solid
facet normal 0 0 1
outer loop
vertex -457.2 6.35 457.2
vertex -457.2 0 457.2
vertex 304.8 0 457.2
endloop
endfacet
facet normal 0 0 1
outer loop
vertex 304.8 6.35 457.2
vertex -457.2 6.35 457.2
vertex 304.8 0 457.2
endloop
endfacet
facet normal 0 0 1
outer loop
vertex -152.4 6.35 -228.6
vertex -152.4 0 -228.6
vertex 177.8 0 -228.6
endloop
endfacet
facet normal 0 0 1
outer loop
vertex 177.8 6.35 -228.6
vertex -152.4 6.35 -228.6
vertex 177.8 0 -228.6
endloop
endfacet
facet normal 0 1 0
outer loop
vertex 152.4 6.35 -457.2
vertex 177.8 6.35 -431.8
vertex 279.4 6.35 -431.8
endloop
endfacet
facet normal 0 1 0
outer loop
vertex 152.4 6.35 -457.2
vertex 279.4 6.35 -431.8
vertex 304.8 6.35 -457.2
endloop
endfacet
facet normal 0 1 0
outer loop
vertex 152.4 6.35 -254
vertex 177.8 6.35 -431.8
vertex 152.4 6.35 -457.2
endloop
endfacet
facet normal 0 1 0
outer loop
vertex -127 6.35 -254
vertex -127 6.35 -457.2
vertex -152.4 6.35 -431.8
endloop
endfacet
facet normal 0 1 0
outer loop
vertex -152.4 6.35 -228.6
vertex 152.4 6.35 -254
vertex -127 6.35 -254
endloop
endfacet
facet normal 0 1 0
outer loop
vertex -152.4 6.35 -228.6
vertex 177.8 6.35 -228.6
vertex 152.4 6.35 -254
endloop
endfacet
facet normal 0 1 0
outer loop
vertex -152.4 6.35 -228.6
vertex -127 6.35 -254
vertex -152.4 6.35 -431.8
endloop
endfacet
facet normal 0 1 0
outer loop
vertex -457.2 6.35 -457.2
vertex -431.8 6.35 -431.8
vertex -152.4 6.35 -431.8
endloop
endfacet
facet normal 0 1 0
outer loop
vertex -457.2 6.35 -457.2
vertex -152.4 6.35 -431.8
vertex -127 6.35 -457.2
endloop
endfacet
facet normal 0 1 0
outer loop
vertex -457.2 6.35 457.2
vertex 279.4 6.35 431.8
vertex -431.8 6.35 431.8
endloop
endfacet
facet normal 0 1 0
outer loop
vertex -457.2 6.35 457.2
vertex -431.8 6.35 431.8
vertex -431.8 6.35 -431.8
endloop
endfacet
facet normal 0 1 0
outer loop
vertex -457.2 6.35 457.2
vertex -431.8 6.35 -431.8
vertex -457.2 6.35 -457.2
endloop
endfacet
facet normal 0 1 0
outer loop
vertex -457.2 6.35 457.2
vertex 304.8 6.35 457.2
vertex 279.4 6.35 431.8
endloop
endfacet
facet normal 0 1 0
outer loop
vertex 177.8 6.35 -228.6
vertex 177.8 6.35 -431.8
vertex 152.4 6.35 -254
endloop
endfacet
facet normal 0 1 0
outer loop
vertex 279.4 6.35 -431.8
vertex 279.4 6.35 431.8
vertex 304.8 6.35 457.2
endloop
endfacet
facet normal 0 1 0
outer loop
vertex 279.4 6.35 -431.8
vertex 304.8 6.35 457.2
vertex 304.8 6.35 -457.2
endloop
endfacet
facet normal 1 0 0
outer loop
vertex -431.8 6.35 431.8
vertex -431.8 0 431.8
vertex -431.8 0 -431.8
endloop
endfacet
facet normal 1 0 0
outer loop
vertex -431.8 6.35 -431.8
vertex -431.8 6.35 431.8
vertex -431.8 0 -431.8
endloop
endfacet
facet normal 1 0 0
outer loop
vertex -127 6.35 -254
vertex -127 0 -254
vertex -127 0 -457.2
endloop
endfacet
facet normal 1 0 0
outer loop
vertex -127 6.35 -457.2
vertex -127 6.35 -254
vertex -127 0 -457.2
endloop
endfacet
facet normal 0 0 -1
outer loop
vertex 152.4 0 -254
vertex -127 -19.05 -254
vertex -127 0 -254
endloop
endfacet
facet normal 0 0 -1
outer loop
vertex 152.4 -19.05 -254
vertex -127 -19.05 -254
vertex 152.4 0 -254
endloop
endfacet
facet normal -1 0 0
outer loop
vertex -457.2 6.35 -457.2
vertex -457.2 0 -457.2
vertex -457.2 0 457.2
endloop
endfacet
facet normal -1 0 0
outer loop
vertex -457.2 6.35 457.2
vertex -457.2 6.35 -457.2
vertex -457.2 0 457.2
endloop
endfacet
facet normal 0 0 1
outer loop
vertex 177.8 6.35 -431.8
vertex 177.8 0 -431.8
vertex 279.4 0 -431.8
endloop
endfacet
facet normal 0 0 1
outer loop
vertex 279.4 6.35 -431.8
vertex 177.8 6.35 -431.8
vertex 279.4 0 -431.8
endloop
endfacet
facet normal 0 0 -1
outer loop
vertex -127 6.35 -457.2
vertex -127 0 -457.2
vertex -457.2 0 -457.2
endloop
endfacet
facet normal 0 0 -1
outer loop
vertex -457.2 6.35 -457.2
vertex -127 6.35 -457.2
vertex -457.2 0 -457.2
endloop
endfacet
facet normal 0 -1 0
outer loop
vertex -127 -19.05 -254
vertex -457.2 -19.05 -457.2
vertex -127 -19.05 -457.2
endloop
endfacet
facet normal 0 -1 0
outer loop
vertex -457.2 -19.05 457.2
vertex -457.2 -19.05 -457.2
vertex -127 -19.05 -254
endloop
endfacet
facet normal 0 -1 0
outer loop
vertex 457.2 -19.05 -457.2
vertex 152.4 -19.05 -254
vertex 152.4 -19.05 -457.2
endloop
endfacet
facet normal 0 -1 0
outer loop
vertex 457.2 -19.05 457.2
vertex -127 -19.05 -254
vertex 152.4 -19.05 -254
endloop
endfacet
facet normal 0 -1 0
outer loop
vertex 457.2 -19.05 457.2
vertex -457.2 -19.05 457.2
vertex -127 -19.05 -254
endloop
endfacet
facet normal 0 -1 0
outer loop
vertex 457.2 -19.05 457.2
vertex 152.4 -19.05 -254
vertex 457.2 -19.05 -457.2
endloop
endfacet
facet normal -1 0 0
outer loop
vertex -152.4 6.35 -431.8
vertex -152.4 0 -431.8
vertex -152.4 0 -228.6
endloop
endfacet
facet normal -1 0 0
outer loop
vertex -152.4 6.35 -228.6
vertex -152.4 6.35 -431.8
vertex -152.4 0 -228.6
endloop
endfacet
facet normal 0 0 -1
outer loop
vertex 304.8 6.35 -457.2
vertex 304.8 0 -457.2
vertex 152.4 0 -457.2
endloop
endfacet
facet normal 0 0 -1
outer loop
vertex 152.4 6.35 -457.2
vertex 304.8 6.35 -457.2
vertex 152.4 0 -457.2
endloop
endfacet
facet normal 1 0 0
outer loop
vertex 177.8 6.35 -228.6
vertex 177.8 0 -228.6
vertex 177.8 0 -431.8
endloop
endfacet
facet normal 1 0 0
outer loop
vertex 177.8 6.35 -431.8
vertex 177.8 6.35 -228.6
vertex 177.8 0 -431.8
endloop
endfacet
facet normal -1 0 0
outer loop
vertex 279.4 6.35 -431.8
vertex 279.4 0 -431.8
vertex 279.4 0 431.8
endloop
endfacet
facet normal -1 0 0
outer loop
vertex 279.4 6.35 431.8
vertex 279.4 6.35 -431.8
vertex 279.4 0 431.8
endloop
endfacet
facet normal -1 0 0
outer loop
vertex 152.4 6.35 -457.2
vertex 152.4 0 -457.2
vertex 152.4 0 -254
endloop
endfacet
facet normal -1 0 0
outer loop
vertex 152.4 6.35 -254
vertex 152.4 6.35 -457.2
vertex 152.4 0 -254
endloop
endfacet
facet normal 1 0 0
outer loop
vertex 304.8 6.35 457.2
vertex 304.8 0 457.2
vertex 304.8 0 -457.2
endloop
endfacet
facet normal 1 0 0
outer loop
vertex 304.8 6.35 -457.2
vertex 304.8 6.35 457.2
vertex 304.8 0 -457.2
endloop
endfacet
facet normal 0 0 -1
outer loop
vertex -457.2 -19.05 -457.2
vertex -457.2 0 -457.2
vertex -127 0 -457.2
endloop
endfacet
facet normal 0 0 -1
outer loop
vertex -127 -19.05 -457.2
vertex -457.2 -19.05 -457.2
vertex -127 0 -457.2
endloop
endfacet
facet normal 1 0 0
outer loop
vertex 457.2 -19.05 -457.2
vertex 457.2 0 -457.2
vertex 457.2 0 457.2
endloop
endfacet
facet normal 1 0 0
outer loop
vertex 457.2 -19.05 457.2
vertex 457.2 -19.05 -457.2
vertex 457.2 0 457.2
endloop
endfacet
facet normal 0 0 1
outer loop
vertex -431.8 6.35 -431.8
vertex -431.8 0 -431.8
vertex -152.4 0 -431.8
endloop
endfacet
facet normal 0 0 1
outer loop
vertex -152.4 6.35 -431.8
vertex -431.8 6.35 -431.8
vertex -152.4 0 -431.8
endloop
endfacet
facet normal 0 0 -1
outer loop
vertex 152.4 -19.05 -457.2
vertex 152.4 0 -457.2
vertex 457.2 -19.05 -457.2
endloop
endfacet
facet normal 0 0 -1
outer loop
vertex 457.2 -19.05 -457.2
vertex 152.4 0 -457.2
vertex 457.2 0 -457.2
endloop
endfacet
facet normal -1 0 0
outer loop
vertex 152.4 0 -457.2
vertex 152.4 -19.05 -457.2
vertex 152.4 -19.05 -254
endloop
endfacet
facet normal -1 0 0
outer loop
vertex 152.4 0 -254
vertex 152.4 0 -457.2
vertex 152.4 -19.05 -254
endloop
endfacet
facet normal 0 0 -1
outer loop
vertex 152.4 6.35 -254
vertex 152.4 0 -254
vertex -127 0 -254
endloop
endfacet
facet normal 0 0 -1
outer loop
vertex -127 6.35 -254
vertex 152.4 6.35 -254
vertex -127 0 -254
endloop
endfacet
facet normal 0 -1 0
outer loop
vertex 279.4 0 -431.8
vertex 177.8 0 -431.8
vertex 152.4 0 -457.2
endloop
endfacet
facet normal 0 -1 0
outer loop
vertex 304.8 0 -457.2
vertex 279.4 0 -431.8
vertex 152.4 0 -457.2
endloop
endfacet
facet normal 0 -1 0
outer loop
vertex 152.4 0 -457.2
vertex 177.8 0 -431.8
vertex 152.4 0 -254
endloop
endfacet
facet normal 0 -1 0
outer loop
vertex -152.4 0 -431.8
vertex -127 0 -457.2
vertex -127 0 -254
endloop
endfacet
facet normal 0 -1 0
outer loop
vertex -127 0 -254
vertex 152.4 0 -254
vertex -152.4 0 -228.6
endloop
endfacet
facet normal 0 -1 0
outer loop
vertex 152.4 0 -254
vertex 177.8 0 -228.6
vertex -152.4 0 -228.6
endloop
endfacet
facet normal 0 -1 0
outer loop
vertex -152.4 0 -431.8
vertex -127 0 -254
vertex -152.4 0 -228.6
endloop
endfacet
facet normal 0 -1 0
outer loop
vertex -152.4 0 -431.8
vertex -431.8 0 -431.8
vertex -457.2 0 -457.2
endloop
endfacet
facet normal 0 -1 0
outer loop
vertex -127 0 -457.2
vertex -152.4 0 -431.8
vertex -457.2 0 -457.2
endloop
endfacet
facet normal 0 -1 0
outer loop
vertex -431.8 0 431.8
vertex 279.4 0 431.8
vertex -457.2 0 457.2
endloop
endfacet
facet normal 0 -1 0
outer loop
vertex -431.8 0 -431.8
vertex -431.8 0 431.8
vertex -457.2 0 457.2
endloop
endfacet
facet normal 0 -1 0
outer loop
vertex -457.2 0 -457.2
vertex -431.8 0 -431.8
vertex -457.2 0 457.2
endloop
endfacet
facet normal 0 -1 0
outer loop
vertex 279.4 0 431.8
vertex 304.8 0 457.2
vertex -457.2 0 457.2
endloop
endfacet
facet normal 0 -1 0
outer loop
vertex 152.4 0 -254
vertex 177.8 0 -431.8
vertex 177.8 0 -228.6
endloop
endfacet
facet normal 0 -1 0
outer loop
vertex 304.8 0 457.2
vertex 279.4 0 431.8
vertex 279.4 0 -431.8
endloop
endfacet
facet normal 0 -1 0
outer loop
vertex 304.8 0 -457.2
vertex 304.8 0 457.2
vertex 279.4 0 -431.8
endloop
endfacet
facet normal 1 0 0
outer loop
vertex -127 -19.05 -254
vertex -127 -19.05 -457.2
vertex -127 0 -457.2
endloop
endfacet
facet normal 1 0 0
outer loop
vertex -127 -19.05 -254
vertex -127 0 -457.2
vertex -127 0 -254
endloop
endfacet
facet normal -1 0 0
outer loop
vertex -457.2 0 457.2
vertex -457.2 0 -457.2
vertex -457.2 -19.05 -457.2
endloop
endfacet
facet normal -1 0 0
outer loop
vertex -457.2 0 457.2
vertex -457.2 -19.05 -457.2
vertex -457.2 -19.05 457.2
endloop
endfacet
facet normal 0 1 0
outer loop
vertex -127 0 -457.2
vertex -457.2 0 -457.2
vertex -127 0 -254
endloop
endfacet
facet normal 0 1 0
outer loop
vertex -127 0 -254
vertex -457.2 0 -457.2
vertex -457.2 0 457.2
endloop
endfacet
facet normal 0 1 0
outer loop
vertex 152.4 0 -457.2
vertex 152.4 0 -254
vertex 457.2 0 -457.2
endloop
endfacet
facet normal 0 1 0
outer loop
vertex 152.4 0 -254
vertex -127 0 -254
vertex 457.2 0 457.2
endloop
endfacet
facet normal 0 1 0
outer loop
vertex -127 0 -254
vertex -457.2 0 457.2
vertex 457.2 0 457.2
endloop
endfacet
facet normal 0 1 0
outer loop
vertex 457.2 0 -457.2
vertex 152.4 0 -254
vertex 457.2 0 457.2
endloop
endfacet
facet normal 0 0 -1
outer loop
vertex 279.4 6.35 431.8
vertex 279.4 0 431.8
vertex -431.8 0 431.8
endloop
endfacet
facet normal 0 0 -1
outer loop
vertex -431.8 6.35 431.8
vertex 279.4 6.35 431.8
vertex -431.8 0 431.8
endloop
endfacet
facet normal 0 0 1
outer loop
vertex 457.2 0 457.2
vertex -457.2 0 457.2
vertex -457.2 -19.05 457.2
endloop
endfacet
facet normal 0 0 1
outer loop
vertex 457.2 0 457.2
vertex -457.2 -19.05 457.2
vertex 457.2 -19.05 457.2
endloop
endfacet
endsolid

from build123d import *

# Parameters (mm, degrees)
F3_W     = 914.4
F3_H     = 914.4
F4_DEPTH = 19.05
F0_W     = 279.4
F0_H     = 203.2
F5_DEPTH = 25
F1_W     = 25.4
F1_H     = 25.4
F2_DEPTH = 6.35


with BuildPart() as f4:
    # F3 (on Front) → F4 (new body)
    with BuildSketch(Plane.XZ):
        Rectangle(F3_W, F3_H)
    extrude(amount=F4_DEPTH)

    # F0 (on face) → F5 (cut)
    with BuildSketch(Plane.XZ.offset(19.05)):
        with Locations((12.7, -355.6)):
            Rectangle(F0_W, F0_H)
    extrude(amount=-F5_DEPTH, mode=Mode.SUBTRACT)


with BuildPart() as f2:
    # F1 (on face) → F2 (new body)
    with BuildSketch(Plane(origin=(0, 0, 0), x_dir=(-1, 0, 0), z_dir=(0, 1, 0))):
        Polygon((457.2, -457.2), (457.2, 457.2), (-304.8, 457.2), (-304.8, -457.2), (-177.8, -457.2), (-177.8, -431.8), (-279.4, -431.8), (-279.4, 431.8), (431.8, 431.8), (431.8, -431.8), (152.4, -431.8), (152.4, -457.2), align=None)
        with Locations((-165.1, -444.5)):
            Rectangle(F1_W, F1_H)
        Polygon((127, -431.8), (152.4, -431.8), (152.4, -228.6), (-177.8, -228.6), (-177.8, -431.8), (-152.4, -431.8), (-152.4, -254), (127, -254), align=None)
        with Locations((139.7, -444.5)):
            Rectangle(F1_W, F1_H)
    extrude(amount=F2_DEPTH)


solid = Compound([f4.part, f2.part])
